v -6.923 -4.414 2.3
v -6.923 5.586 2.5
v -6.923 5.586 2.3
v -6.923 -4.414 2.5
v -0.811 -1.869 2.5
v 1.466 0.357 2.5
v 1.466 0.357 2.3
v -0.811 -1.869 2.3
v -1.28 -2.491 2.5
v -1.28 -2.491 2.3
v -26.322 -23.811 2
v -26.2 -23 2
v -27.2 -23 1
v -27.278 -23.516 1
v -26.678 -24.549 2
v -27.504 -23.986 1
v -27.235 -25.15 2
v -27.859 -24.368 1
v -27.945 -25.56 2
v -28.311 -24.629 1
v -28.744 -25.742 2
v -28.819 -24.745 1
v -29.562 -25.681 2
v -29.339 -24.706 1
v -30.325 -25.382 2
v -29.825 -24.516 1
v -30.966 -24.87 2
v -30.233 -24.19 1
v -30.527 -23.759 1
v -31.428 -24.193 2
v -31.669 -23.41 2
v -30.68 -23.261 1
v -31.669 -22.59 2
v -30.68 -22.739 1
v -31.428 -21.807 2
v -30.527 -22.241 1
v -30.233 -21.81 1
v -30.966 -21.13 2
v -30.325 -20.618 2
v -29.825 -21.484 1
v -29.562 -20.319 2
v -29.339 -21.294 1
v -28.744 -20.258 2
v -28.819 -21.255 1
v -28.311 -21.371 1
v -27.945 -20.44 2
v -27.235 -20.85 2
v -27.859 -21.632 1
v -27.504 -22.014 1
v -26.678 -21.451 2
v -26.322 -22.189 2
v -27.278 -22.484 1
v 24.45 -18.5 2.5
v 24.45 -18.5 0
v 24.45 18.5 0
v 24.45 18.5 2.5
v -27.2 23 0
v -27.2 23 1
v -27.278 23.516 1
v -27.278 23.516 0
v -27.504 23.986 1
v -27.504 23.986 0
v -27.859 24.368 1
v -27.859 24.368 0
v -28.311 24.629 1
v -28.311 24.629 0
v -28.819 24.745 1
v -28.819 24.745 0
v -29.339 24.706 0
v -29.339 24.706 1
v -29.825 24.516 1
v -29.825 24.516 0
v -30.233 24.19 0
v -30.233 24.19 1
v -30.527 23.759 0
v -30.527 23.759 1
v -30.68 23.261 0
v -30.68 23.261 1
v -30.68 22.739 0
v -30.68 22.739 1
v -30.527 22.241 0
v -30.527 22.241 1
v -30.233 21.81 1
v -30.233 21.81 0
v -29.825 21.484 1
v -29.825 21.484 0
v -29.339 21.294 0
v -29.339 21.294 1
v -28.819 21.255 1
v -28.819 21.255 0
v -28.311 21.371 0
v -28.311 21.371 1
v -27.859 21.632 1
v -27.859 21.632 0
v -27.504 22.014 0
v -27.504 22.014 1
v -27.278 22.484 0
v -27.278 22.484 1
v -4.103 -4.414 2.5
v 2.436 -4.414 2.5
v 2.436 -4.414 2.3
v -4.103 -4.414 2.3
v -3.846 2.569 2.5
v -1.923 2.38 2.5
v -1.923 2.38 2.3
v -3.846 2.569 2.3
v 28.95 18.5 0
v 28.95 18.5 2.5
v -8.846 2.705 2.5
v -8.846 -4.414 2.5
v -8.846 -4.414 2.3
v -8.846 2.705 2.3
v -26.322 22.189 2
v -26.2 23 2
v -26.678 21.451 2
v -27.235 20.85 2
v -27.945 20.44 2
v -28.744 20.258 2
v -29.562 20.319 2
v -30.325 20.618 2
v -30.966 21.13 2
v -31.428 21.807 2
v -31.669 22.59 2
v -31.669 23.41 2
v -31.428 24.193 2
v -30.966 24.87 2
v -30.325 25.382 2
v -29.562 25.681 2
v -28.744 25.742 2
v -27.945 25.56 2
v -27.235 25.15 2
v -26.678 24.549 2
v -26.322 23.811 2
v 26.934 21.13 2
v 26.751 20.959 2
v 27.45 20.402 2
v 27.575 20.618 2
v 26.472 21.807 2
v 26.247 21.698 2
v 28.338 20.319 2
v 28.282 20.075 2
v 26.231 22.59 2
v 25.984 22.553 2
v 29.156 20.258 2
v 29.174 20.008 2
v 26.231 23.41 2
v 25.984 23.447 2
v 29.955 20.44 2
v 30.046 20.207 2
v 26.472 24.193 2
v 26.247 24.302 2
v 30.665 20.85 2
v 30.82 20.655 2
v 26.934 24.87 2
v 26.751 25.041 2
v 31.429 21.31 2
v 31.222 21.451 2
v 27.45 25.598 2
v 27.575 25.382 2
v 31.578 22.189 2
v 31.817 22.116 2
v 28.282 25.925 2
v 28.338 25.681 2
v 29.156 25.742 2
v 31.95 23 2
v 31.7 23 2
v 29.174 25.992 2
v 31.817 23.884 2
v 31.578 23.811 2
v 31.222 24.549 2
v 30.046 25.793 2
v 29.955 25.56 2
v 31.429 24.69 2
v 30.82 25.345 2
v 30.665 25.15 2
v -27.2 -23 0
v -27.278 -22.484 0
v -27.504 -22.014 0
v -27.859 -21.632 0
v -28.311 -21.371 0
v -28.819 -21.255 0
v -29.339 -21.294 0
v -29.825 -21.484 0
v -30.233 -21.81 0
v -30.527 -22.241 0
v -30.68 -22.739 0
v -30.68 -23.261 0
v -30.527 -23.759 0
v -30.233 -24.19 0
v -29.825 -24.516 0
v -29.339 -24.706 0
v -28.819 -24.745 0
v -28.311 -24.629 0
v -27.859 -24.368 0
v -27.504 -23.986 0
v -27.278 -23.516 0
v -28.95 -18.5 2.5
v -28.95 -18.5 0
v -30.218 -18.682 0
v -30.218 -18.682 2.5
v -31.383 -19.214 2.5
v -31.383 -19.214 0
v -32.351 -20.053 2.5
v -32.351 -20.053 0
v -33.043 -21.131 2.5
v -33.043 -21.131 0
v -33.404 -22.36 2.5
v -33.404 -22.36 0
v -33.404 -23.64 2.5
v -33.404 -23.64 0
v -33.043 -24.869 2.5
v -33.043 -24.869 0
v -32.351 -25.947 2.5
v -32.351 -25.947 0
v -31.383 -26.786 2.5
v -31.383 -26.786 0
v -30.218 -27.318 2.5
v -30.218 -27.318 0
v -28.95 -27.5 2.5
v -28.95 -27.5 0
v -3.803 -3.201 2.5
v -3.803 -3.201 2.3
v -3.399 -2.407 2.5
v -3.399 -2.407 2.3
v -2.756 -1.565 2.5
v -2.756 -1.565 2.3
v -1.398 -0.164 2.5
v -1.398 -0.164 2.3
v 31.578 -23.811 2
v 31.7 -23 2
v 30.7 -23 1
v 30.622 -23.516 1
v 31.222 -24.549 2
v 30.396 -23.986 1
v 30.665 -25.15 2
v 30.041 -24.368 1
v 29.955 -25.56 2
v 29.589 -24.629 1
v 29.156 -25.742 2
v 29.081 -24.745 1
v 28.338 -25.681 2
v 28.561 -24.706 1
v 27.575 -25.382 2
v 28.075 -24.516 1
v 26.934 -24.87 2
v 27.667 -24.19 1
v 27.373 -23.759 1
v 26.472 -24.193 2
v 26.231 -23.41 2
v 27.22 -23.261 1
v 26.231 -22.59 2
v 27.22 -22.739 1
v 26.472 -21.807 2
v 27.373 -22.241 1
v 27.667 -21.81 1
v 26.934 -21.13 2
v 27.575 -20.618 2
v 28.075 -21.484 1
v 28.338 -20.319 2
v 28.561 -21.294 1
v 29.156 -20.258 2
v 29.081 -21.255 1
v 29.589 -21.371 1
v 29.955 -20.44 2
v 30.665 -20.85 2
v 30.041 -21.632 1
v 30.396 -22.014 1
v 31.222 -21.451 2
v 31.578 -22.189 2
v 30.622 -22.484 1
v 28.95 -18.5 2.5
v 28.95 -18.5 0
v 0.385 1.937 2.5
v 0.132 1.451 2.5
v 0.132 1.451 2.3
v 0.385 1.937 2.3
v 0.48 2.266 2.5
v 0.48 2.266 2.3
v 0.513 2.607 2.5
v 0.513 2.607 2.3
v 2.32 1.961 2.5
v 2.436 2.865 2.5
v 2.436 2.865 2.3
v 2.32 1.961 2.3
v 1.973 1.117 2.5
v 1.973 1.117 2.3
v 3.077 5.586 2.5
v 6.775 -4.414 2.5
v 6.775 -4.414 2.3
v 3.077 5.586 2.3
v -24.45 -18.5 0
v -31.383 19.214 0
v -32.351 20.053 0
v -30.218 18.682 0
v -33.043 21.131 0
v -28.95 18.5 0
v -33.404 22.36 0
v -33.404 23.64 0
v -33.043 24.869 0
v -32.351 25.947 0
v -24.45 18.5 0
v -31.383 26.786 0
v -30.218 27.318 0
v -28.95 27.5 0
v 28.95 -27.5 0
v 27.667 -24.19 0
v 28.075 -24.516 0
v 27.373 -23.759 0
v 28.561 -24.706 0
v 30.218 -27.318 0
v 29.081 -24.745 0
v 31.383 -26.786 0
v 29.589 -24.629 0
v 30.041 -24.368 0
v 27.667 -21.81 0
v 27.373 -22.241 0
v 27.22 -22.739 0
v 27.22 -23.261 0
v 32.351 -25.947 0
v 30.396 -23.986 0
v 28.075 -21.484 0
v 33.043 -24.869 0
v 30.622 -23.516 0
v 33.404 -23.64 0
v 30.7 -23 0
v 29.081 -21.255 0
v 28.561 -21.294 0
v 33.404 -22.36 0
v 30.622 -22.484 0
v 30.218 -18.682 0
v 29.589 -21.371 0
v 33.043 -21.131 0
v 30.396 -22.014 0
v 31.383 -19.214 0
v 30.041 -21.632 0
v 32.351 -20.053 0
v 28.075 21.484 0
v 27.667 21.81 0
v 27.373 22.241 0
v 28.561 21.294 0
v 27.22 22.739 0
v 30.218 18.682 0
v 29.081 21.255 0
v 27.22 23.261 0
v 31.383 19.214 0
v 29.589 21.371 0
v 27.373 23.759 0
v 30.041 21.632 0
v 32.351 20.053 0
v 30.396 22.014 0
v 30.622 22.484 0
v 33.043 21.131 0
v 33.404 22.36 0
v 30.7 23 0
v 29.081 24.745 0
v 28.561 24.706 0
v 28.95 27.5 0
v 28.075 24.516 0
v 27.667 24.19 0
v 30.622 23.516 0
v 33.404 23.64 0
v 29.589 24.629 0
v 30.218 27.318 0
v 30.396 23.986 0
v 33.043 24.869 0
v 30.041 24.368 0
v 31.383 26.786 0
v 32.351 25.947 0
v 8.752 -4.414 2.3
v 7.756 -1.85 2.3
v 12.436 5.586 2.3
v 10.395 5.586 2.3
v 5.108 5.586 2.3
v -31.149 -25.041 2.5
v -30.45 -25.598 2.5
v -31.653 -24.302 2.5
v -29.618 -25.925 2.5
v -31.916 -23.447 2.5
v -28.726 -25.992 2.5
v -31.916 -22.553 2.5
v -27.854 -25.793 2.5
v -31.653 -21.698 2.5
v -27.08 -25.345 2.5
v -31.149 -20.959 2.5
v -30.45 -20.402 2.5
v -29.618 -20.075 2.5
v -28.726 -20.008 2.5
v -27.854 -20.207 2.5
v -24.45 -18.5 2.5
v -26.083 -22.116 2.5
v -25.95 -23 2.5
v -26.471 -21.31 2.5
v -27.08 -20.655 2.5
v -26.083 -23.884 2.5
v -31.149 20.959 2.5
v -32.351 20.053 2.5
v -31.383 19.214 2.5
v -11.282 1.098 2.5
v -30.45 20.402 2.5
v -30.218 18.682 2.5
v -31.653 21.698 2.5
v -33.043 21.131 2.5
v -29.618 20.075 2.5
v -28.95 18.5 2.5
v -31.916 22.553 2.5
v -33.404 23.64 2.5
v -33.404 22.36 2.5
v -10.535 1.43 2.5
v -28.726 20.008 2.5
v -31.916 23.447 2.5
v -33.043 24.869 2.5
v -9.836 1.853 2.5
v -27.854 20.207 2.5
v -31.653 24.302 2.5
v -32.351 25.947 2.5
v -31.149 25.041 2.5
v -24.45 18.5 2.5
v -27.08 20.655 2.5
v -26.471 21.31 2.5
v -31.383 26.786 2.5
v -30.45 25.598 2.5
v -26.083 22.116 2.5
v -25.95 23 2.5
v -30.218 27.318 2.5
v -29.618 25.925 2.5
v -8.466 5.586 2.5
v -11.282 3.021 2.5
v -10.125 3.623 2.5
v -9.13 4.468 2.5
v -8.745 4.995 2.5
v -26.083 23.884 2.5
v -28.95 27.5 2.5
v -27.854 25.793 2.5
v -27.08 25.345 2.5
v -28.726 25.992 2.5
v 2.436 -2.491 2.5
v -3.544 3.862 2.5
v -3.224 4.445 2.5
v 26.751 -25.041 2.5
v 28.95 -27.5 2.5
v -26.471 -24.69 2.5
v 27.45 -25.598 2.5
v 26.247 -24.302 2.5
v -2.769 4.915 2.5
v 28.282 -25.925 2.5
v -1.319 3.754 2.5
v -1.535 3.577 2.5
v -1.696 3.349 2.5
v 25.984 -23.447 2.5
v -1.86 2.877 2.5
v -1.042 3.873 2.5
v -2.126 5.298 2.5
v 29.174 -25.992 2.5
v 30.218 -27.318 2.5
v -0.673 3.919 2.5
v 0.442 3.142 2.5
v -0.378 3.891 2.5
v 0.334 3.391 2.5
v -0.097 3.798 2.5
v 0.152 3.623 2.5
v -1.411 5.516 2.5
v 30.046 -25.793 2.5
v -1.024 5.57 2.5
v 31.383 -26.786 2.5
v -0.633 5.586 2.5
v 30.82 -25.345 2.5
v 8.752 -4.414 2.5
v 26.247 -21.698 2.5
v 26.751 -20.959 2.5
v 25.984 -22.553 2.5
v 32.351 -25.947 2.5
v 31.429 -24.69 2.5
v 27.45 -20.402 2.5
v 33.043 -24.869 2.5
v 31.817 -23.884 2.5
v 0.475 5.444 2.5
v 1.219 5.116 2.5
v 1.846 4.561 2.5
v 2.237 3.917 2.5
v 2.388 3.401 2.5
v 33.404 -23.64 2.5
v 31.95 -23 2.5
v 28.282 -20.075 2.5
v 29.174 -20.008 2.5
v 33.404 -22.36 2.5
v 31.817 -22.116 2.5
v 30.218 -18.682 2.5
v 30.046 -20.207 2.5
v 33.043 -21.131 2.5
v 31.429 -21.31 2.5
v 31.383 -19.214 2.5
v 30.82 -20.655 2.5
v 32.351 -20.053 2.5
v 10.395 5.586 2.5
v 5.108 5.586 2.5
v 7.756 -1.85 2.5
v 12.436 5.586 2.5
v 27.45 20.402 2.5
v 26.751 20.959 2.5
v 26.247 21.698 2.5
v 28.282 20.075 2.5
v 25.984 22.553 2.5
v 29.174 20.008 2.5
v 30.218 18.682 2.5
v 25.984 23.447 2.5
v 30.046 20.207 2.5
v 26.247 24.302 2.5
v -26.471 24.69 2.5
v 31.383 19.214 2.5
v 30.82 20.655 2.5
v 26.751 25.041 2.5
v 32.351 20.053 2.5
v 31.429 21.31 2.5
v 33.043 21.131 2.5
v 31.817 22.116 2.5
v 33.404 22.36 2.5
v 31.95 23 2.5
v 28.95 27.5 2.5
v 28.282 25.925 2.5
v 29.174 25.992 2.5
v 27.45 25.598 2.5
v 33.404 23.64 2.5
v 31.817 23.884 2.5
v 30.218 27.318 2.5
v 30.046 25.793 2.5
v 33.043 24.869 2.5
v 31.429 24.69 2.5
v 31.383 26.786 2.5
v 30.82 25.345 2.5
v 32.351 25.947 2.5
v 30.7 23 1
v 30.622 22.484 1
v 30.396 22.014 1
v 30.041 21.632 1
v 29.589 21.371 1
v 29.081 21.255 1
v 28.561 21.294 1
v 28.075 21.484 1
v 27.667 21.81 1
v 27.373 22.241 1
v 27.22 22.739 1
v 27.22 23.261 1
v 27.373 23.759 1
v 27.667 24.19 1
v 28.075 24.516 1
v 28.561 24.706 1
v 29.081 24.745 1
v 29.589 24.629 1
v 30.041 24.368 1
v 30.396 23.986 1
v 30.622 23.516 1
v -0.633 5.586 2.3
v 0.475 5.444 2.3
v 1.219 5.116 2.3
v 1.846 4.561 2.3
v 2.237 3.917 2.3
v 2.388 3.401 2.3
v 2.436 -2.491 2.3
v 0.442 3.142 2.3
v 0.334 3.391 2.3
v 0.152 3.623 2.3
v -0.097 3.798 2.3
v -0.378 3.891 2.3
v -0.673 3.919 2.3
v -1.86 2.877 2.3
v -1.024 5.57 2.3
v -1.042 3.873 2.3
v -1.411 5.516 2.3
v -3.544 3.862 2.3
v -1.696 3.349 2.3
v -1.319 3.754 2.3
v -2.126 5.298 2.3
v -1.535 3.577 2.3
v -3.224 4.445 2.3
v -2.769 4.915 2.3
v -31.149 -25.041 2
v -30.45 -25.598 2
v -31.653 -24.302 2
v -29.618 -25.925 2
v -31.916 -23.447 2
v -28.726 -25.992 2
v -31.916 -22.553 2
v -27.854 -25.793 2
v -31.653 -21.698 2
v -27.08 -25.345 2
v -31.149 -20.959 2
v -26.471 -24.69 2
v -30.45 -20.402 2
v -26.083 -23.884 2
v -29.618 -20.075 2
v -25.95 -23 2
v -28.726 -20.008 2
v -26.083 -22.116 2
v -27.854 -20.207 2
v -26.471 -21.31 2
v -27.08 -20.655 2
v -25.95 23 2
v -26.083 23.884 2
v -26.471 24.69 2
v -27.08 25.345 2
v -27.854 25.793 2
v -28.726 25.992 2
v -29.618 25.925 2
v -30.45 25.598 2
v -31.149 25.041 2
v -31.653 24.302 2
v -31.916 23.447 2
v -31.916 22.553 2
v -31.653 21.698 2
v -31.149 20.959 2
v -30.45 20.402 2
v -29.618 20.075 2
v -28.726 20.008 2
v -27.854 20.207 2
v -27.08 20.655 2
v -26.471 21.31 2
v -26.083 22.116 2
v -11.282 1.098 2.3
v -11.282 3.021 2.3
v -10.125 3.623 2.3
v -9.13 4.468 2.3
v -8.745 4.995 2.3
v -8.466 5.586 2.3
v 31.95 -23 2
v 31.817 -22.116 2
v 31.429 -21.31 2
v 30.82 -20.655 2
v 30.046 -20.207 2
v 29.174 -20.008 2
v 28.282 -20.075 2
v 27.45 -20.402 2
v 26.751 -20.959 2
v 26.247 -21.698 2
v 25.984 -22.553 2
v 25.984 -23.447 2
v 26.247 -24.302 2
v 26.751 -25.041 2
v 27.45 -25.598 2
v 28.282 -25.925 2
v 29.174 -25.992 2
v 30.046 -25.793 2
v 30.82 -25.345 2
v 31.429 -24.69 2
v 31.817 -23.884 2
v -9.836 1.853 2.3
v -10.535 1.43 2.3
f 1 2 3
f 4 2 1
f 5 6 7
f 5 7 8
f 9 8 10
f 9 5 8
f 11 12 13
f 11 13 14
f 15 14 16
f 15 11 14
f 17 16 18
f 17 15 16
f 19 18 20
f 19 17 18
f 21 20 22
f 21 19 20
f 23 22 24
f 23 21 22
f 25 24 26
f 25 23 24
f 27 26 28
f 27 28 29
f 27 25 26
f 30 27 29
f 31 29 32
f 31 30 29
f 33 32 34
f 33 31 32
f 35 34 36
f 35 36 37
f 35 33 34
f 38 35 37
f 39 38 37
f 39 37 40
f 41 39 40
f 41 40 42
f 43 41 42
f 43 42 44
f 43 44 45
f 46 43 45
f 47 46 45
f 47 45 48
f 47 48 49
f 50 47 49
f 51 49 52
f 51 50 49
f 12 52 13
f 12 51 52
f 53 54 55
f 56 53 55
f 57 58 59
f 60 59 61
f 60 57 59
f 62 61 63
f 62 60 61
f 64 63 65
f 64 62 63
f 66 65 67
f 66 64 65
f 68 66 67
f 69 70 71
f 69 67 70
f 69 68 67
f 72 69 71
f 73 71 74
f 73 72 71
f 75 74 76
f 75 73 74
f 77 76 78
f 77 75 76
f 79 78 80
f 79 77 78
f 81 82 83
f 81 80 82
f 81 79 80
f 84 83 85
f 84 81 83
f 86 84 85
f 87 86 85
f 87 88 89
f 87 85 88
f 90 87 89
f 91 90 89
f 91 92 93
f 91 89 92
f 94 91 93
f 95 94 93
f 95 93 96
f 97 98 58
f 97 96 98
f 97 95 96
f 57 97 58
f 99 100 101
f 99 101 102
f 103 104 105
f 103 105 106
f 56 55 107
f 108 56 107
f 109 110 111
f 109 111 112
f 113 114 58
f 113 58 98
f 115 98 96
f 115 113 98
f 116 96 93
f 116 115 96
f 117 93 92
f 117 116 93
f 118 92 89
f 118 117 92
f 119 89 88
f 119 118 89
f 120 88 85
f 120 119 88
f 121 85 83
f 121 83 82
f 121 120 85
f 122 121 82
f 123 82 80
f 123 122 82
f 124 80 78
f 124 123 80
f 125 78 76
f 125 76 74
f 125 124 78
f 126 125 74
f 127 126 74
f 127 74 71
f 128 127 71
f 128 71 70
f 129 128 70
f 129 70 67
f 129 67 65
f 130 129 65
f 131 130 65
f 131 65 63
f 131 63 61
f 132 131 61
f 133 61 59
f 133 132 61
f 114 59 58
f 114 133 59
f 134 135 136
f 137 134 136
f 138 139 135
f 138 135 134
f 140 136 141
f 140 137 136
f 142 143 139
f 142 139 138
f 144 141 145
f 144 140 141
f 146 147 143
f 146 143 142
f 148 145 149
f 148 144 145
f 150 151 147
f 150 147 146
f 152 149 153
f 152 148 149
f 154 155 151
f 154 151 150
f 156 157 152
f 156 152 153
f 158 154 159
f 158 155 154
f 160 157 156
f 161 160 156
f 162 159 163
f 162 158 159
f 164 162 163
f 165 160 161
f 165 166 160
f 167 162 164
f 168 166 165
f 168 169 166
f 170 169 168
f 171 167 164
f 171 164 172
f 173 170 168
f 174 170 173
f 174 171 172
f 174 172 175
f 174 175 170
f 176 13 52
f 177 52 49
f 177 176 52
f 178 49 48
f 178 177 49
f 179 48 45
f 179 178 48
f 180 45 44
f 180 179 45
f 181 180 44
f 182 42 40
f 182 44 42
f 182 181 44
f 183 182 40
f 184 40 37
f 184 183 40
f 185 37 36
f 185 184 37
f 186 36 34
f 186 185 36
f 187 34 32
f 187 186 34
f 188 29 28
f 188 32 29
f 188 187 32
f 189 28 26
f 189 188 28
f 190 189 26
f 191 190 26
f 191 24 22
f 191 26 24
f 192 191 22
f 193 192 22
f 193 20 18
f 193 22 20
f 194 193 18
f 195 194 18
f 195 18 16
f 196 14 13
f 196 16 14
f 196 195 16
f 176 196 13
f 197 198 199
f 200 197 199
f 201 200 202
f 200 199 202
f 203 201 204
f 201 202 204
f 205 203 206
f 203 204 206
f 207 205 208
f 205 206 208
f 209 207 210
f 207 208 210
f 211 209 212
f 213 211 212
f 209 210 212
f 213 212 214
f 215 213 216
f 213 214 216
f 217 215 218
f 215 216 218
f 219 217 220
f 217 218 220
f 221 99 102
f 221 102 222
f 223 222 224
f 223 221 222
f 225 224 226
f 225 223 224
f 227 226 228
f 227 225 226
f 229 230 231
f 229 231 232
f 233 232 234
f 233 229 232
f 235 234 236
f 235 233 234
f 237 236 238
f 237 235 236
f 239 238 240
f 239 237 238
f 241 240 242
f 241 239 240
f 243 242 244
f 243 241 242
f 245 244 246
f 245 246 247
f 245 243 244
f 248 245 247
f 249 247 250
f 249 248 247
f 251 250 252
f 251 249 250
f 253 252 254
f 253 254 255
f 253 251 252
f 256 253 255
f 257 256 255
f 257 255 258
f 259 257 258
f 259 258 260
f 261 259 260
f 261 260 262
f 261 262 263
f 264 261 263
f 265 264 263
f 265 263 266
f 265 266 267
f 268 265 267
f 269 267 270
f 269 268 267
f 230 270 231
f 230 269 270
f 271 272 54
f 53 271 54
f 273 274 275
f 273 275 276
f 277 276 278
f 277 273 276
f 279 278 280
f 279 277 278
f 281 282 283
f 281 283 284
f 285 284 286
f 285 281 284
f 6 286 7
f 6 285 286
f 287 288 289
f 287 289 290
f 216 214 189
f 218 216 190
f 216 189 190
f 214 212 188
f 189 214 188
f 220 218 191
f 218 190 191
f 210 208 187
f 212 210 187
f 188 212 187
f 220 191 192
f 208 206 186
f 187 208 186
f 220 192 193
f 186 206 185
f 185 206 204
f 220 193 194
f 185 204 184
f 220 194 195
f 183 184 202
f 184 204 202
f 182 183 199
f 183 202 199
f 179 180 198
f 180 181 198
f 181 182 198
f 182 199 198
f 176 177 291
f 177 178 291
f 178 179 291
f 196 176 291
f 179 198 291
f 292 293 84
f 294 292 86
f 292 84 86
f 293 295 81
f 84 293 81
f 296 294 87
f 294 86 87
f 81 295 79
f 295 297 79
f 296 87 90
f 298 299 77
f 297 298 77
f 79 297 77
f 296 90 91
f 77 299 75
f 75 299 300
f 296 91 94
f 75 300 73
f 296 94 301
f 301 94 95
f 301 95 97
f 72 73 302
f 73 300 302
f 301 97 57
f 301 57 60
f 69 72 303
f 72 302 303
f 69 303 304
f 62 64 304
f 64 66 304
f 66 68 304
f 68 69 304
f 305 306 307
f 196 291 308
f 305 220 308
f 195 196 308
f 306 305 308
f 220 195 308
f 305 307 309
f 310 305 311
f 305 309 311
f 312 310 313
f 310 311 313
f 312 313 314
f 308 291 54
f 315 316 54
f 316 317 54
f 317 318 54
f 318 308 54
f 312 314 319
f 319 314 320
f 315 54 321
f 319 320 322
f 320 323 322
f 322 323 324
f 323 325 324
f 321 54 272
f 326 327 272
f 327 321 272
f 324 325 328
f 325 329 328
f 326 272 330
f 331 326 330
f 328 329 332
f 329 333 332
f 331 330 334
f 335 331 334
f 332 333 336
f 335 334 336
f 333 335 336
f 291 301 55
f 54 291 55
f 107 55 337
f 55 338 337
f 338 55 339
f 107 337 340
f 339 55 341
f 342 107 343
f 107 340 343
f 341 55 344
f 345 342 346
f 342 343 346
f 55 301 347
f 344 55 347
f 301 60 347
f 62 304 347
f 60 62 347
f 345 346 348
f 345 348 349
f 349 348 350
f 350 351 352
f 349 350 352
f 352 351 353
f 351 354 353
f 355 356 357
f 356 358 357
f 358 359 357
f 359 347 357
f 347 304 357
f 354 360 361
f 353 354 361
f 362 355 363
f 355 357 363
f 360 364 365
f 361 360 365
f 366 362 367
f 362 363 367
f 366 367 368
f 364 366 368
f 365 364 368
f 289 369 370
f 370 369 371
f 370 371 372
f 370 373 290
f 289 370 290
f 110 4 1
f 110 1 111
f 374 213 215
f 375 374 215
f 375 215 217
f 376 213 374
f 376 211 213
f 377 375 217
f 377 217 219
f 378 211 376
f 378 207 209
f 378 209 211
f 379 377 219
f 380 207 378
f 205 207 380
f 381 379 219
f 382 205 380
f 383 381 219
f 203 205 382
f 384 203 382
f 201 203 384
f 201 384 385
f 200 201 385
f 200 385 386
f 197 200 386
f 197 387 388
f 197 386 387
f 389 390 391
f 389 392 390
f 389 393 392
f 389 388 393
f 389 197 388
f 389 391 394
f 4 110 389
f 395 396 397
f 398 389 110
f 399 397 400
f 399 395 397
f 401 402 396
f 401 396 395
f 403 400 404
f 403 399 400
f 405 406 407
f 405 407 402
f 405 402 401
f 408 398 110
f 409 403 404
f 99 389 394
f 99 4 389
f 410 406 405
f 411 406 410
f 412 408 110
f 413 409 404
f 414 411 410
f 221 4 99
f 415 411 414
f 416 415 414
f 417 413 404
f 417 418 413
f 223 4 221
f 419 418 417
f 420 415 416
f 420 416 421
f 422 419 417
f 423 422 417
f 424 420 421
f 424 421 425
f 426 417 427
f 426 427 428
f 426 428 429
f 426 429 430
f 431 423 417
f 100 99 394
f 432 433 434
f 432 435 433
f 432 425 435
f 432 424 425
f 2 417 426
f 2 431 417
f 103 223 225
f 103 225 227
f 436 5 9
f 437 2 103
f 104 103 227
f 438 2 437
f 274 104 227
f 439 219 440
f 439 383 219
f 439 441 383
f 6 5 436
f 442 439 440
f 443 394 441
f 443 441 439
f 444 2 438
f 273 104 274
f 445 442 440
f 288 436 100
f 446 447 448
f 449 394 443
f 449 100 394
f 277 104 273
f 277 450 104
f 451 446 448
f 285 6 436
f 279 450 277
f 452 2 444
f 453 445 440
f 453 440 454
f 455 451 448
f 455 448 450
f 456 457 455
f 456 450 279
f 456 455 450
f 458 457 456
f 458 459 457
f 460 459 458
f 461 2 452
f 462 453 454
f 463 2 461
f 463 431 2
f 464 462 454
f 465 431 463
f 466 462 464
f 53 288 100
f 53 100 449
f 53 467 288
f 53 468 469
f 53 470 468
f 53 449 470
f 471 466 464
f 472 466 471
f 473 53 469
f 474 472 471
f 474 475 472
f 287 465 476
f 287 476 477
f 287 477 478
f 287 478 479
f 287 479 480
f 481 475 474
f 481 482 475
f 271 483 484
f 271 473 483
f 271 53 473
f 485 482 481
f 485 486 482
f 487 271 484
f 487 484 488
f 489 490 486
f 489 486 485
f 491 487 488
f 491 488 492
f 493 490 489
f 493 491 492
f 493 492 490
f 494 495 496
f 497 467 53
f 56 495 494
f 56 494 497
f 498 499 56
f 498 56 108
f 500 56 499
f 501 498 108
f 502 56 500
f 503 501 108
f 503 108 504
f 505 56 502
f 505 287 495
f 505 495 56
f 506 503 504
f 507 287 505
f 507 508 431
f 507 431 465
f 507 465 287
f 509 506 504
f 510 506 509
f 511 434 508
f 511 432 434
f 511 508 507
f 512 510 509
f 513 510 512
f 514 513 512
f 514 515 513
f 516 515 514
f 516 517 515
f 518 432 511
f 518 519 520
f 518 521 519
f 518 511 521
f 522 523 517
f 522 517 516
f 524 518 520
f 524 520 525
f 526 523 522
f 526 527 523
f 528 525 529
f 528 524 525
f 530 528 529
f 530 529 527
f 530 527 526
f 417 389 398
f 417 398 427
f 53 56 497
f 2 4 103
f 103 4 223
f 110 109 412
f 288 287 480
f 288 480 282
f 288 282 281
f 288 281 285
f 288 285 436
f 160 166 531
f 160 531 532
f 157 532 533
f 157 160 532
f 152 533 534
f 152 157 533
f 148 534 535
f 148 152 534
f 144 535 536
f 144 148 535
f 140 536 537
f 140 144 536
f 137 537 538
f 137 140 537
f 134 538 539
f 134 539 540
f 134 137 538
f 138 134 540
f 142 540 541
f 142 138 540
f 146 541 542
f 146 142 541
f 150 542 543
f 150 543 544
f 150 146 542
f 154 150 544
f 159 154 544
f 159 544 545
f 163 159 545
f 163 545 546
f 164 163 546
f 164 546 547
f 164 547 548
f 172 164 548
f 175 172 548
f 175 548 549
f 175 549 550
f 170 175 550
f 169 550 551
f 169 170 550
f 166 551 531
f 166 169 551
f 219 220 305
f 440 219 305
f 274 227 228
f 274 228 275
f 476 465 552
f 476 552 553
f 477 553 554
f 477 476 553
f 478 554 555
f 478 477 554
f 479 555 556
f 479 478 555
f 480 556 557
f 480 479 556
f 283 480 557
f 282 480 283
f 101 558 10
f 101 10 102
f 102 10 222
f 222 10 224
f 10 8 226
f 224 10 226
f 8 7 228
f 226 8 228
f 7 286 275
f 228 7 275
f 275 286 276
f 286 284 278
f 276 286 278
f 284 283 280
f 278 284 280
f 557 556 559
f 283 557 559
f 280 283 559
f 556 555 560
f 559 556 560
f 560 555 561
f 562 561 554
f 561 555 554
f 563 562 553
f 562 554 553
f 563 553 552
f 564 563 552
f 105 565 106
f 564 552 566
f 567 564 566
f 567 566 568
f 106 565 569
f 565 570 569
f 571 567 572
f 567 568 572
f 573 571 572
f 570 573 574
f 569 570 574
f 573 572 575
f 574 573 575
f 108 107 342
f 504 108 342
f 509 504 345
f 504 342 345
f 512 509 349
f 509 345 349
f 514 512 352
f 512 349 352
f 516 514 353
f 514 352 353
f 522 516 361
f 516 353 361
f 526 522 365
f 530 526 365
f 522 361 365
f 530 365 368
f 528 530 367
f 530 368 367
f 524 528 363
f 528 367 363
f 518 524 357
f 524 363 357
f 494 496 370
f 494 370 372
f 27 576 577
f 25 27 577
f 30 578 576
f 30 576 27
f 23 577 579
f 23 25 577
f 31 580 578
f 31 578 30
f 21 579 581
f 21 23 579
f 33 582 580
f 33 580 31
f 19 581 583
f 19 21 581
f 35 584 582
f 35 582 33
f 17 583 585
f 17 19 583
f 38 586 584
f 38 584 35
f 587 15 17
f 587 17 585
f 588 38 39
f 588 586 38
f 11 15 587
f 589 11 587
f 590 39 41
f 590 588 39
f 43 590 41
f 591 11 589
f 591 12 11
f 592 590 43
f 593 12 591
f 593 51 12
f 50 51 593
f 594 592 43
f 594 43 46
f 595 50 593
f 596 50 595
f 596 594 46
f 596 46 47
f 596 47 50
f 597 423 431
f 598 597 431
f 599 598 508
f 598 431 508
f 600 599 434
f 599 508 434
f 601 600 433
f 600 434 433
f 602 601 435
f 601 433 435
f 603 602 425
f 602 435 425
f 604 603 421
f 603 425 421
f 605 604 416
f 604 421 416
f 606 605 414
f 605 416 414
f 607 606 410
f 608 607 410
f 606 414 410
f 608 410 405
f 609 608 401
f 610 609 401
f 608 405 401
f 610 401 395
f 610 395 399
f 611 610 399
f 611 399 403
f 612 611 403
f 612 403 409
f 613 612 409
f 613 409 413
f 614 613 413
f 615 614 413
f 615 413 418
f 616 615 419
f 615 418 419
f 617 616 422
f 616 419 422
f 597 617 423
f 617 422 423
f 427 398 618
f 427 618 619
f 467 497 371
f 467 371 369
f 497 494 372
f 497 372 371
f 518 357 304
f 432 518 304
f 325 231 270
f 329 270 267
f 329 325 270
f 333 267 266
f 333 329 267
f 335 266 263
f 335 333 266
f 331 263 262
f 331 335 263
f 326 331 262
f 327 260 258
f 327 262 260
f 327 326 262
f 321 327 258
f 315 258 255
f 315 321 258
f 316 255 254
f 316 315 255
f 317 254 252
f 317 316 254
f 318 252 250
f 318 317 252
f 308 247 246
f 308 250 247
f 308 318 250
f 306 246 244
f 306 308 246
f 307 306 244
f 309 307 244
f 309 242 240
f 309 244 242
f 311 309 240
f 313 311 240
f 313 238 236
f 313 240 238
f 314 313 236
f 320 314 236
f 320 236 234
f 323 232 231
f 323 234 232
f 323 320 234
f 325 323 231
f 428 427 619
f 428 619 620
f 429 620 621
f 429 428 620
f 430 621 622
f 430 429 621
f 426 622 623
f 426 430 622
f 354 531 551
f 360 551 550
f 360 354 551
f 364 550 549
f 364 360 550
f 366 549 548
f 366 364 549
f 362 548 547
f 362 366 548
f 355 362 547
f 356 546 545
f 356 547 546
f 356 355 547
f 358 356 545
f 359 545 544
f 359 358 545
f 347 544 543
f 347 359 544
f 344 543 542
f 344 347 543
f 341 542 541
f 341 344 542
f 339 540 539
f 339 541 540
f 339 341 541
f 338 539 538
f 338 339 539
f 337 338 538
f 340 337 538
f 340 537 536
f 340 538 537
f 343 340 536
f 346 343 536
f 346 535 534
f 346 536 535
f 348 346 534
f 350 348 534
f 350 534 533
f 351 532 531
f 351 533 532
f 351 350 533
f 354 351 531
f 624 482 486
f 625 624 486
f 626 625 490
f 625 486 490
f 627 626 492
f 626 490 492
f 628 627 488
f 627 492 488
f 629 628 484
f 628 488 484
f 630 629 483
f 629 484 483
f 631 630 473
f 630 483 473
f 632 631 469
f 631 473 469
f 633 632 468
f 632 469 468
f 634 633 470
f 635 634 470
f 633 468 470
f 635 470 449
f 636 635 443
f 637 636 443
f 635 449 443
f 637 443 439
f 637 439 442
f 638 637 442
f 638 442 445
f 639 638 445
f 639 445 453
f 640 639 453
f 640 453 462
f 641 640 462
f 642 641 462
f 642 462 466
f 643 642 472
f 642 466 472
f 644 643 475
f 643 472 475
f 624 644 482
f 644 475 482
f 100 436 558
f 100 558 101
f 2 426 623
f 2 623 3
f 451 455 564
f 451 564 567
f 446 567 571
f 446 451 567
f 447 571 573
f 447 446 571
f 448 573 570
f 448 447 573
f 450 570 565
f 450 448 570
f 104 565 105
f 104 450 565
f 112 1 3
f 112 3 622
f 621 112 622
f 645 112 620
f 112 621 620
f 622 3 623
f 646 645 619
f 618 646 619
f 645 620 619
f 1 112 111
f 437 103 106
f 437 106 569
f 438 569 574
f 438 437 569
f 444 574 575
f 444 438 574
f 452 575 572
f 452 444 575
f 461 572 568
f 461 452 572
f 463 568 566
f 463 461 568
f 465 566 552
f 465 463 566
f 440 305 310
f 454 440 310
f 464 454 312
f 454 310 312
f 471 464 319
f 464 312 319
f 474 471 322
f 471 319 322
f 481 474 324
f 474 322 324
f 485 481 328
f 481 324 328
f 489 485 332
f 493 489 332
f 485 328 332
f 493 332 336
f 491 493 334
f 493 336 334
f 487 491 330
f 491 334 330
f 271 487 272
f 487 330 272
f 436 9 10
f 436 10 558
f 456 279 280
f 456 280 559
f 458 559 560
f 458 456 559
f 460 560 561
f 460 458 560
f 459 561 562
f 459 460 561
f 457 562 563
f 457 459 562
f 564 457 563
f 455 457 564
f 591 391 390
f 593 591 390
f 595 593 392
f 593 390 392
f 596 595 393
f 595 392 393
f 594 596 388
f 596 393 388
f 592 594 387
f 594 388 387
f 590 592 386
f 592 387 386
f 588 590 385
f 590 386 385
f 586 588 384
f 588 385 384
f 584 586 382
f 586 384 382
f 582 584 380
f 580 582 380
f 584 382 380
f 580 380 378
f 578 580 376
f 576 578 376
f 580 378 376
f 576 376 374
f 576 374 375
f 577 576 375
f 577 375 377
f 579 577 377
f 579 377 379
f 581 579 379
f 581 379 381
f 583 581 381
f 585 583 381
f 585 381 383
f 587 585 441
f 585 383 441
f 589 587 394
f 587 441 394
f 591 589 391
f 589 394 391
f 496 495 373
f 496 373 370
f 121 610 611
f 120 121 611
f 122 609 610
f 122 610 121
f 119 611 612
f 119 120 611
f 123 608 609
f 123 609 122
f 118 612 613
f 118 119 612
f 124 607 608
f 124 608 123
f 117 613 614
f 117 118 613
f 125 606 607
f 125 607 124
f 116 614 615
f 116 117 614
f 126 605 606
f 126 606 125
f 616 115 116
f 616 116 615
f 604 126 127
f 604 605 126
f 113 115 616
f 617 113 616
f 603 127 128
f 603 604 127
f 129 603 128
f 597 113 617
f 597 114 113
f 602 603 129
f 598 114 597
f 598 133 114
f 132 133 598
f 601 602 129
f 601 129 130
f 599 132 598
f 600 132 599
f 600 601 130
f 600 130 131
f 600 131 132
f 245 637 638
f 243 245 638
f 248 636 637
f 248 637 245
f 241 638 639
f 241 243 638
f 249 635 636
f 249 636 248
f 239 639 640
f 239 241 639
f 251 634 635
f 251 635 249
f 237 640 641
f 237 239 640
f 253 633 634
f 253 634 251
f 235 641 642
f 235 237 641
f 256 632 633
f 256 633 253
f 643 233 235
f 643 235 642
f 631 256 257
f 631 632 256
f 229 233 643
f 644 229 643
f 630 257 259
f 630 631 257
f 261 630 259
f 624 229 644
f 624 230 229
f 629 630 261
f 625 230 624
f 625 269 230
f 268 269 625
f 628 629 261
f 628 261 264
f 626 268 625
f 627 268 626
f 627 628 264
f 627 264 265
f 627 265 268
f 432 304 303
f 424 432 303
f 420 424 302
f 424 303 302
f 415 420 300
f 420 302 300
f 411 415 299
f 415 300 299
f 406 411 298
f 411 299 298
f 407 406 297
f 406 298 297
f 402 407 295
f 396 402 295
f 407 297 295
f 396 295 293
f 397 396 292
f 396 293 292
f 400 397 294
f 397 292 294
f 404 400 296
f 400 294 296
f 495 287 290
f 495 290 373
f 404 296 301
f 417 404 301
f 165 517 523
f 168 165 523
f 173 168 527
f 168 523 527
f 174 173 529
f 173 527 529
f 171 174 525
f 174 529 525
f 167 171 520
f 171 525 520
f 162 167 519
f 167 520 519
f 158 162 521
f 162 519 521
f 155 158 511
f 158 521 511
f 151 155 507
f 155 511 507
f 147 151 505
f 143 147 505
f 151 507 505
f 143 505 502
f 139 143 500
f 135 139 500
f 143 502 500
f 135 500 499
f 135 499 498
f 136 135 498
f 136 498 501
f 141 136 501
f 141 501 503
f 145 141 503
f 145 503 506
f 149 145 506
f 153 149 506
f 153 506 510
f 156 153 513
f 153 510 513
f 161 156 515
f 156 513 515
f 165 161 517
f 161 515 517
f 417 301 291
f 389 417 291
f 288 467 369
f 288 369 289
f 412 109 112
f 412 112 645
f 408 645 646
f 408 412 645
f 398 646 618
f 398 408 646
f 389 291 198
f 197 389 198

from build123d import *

# Parameters (mm, degrees)
SKETCH1_R           = 1.75
BOSS_EXTRUDE1_DEPTH = 2.5
CUT_EXTRUDE1_DEPTH  = 0.2
SKETCH5_R           = 3
CUT_EXTRUDE2_DEPTH  = 0.5
CHAMFER2_SIZE       = 1


with BuildPart() as part:
    # Sketch1 → Boss-Extrude1 (new body)
    with BuildSketch(Plane.XY):
        with BuildLine():
            ThreePointArc((-28.95, 27.5), (-33.45, 23), (-28.95, 18.5))
            Line((-28.95, 18.5), (-24.45, 18.5))
            Line((-24.45, 18.5), (-24.45, -18.5))
            Line((-24.45, -18.5), (-28.95, -18.5))
            ThreePointArc((-28.95, -18.5), (-33.45, -23), (-28.95, -27.5))
            Line((-28.95, -27.5), (28.95, -27.5))
            ThreePointArc((28.95, -27.5), (33.45, -23), (28.95, -18.5))
            Line((28.95, -18.5), (24.45, -18.5))
            Line((24.45, -18.5), (24.45, 18.5))
            Line((24.45, 18.5), (28.95, 18.5))
            ThreePointArc((28.95, 18.5), (33.45, 23), (28.95, 27.5))
            Line((28.95, 27.5), (-28.95, 27.5))
        make_face()
        with Locations((-28.95, -23)):
            Circle(SKETCH1_R, mode=Mode.SUBTRACT)
        with Locations((-28.95, 23)):
            Circle(SKETCH1_R, mode=Mode.SUBTRACT)
        with Locations((28.95, 23)):
            Circle(SKETCH1_R, mode=Mode.SUBTRACT)
        with Locations((28.95, -23)):
            Circle(SKETCH1_R, mode=Mode.SUBTRACT)
    extrude(amount=BOSS_EXTRUDE1_DEPTH)

    # Sketch4 → Cut-Extrude1 (cut)
    with BuildSketch(Plane.XY.offset(2.5)):
        with BuildLine():
            Line((-6.923076923, -4.414458023), (-8.846153846, -4.414458023))
            Line((-8.846153846, -4.414458023), (-8.846153846, 2.704933003))
            add(Edge.make_bspline(
                [(-8.846153846, 2.704933003), (-8.933318023, 2.616445103), (-9.106463901, 2.440669737), (-9.383005145, 2.19548654), (-9.670097117, 1.967401521), (-9.970580856, 1.758581072), (-10.280528273, 1.566049869), (-10.603106853, 1.391327059), (-10.935978437, 1.231995104), (-11.166572995, 1.142953291), (-11.282051282, 1.09836249)],
                knots=[0, 0, 0, 0, 0.000372537, 0.00074002, 0.001107934, 0.001471928, 0.001837155, 0.002201986, 0.002572064, 0.002943306, 0.002943306, 0.002943306, 0.002943306], degree=3))
            Line((-11.282051282, 1.09836249), (-11.282051282, 3.021439413))
            add(Edge.make_bspline(
                [(-11.282051282, 3.021439413), (-11.153980048, 3.06946063), (-10.88593692, 3.1699653), (-10.490395403, 3.38374383), (-10.077539391, 3.648423218), (-9.730716774, 3.908012402), (-9.455353873, 4.138807932), (-9.26289614, 4.324331325), (-9.084572984, 4.514316902), (-8.927087219, 4.714896702), (-8.786304768, 4.922015444), (-8.661565378, 5.135334763), (-8.551766041, 5.355528522), (-8.494286856, 5.508866571), (-8.465544872, 5.585541977)],
                knots=[0, 0, 0, 0, 0.000409928, 0.000857948, 0.001345291, 0.001880548, 0.002156279, 0.002422637, 0.002682042, 0.002937331, 0.003186801, 0.003432796, 0.003678268, 0.003923781, 0.003923781, 0.003923781, 0.003923781], degree=3))
            Line((-8.465544872, 5.585541977), (-6.923076923, 5.585541977))
            Line((-6.923076923, 5.585541977), (-6.923076923, -4.414458023))
        make_face()
        with BuildLine():
            Line((2.435897436, -2.4913811), (2.435897436, -4.414458023))
            Line((2.435897436, -4.414458023), (-4.102564103, -4.414458023))
            add(Edge.make_bspline(
                [(-4.102564103, -4.414458023), (-4.080426387, -4.250103198), (-4.036163368, -3.921485704), (-3.899317938, -3.441458257), (-3.716676165, -2.973033485), (-3.518453211, -2.59184942), (-3.321298527, -2.285009365), (-3.142420071, -2.033582253), (-2.929024642, -1.766074598), (-2.684208836, -1.480326872), (-2.409325608, -1.175445832), (-2.102324151, -0.852564961), (-1.761740021, -0.513229981), (-1.522133018, -0.282804832), (-1.398237179, -0.163656741)],
                knots=[0, 0, 0, 0, 0.000496964, 0.00099365, 0.001492867, 0.002003586, 0.002279214, 0.0025866, 0.002928861, 0.003305405, 0.003715318, 0.004160237, 0.004641841, 0.005157509, 0.005157509, 0.005157509, 0.005157509], degree=3))
            add(Edge.make_bspline(
                [(-1.398237179, -0.163656741), (-1.299366883, -0.068219837), (-1.111146958, 0.113463921), (-0.843121421, 0.373627698), (-0.607499354, 0.612792158), (-0.399354228, 0.824759525), (-0.22349449, 1.014927025), (-0.077606865, 1.180308106), (0.040156295, 1.321576252), (0.103936924, 1.411196852), (0.132211538, 1.450926592)],
                knots=[0, 0, 0, 0, 0.000412257, 0.000784815, 0.001120524, 0.001419431, 0.001676006, 0.00189743, 0.002081082, 0.002227329, 0.002227329, 0.002227329, 0.002227329], degree=3))
            add(Edge.make_bspline(
                [(0.132211538, 1.450926592), (0.190111047, 1.547103861), (0.30179249, 1.73261867), (0.424260458, 2.024344061), (0.497770298, 2.316009192), (0.507857836, 2.510898163), (0.512820513, 2.606775951)],
                knots=[0, 0, 0, 0, 0.000336425, 0.000648925, 0.000945785, 0.00123325, 0.00123325, 0.00123325, 0.00123325], degree=3))
            add(Edge.make_bspline(
                [(0.512820513, 2.606775951), (0.509218846, 2.70654968), (0.502404775, 2.895313794), (0.445267605, 3.161694863), (0.343944107, 3.390687129), (0.204440295, 3.582993487), (0.028037447, 3.733664782), (-0.178182613, 3.844996243), (-0.417238616, 3.906548032), (-0.585261277, 3.914644013), (-0.673076923, 3.91887531)],
                knots=[0, 0, 0, 0, 0.000299149, 0.000565967, 0.000811668, 0.001045254, 0.001272527, 0.001501953, 0.00174248, 0.002005823, 0.002005823, 0.002005823, 0.002005823], degree=3))
            add(Edge.make_bspline(
                [(-0.673076923, 3.91887531), (-0.760299295, 3.914923595), (-0.928794085, 3.907289734), (-1.168261741, 3.840601371), (-1.377751743, 3.7251568), (-1.52704546, 3.593596575), (-1.627900447, 3.465663812), (-1.696619517, 3.354178836), (-1.755849991, 3.227497715), (-1.808333132, 3.087046666), (-1.84978888, 2.931216675), (-1.883174765, 2.761194545), (-1.910078959, 2.576065314), (-1.918634967, 2.447276207), (-1.923076923, 2.380413772)],
                knots=[0, 0, 0, 0, 0.000261347, 0.000504866, 0.000737962, 0.000973524, 0.001096162, 0.001225691, 0.001365471, 0.001515056, 0.001674936, 0.001848581, 0.002034706, 0.002235667, 0.002235667, 0.002235667, 0.002235667], degree=3))
            Line((-1.923076923, 2.380413772), (-3.846153846, 2.568715054))
            add(Edge.make_bspline(
                [(-3.846153846, 2.568715054), (-3.830692606, 2.698546985), (-3.80071573, 2.950270356), (-3.725907936, 3.311831909), (-3.631166636, 3.645388763), (-3.511975194, 3.950321896), (-3.373259936, 4.228570387), (-3.207945231, 4.475958944), (-3.021807349, 4.695227932), (-2.814685425, 4.886260652), (-2.5878962, 5.049664829), (-2.349921603, 5.195528131), (-2.096110944, 5.315182407), (-1.829258686, 5.413795508), (-1.549485425, 5.49260631), (-1.255497172, 5.544714943), (-0.949108314, 5.581368356), (-0.739966, 5.584129802), (-0.633012821, 5.585541977)],
                knots=[0, 0, 0, 0, 0.000392096, 0.000760212, 0.001106367, 0.001431121, 0.001741094, 0.002037223, 0.002321424, 0.002602116, 0.002880179, 0.003158798, 0.003438358, 0.003720412, 0.004011539, 0.004308966, 0.004615352, 0.004936021, 0.004936021, 0.004936021, 0.004936021], degree=3))
            add(Edge.make_bspline(
                [(-0.633012821, 5.585541977), (-0.516740897, 5.583307291), (-0.290286727, 5.57895496), (0.040296159, 5.543013371), (0.350855029, 5.480344005), (0.644105005, 5.397329559), (0.917034567, 5.286499204), (1.171918028, 5.152509913), (1.404743968, 4.990276522), (1.618982973, 4.808646307), (1.810495503, 4.608911963), (1.978243149, 4.395861516), (2.118781575, 4.169643399), (2.236714897, 3.93301496), (2.324279592, 3.682168505), (2.388083037, 3.420572552), (2.43038729, 3.147006702), (2.434040407, 2.960167431), (2.435897436, 2.865189413)],
                knots=[0, 0, 0, 0, 0.000348765, 0.000679263, 0.000995909, 0.001298314, 0.001592185, 0.001878054, 0.002160328, 0.002441705, 0.002719393, 0.002989083, 0.003253658, 0.003517047, 0.003780619, 0.004048809, 0.004324175, 0.004608884, 0.004608884, 0.004608884, 0.004608884], degree=3))
            add(Edge.make_bspline(
                [(2.435897436, 2.865189413), (2.433450826, 2.756184824), (2.428597126, 2.539936446), (2.382126554, 2.220256739), (2.311128567, 1.907948806), (2.206199134, 1.602249395), (2.073192931, 1.295825486), (1.901744746, 0.987989283), (1.702680436, 0.669456993), (1.546820928, 0.463511968), (1.466346154, 0.357176592)],
                knots=[0, 0, 0, 0, 0.000326823, 0.000648367, 0.000967129, 0.0012864, 0.001616516, 0.001967917, 0.002342489, 0.002742354, 0.002742354, 0.002742354, 0.002742354], degree=3))
            add(Edge.make_bspline(
                [(1.466346154, 0.357176592), (1.435930222, 0.318867637), (1.370786347, 0.236818733), (1.259959496, 0.111009427), (1.131520709, -0.026413994), (0.987284126, -0.178023781), (0.82248533, -0.338451015), (0.643053791, -0.51440464), (0.441093999, -0.696884043), (0.231912595, -0.890441198), (0.021821946, -1.078827655), (-0.171281651, -1.257753025), (-0.34668397, -1.416063548), (-0.496216198, -1.562498691), (-0.628673782, -1.687064362), (-0.739282513, -1.796148144), (-0.830112141, -1.887109206), (-0.955269523, -2.028894425), (-1.114518089, -2.220658992), (-1.226555966, -2.40389546), (-1.280048077, -2.4913811)],
                knots=[0, 0, 0, 0, 0.000146727, 0.000314255, 0.00050278, 0.000711046, 0.000941937, 0.00119269, 0.00146489, 0.001758378, 0.002047687, 0.002311396, 0.002548156, 0.002756422, 0.002939197, 0.0030936, 0.003222507, 0.003324651, 0.003660963, 0.003968244, 0.003968244, 0.003968244, 0.003968244], degree=3))
            Line((-1.280048077, -2.4913811), (2.435897436, -2.4913811))
        make_face()
        Polygon((6.774839744, -4.414458023), (3.076923077, 5.585541977), (5.108173077, 5.585541977), (7.756410256, -1.850355459), (10.39463141, 5.585541977), (12.435897436, 5.585541977), (8.752003205, -4.414458023), align=None)
    extrude(amount=-CUT_EXTRUDE1_DEPTH, mode=Mode.SUBTRACT)

    # Sketch5 → Cut-Extrude2 (cut)
    with BuildSketch(Plane.XY.offset(2.5)):
        with Locations((-28.95, 23)):
            Circle(SKETCH5_R)
        with Locations((28.95, 23)):
            Circle(SKETCH5_R)
        with Locations((28.95, -23)):
            Circle(SKETCH5_R)
        with Locations((-28.95, -23)):
            Circle(SKETCH5_R)
    extrude(amount=-CUT_EXTRUDE2_DEPTH, mode=Mode.SUBTRACT)

    # Chamfer2
    chamfer2_edges = [part.edges().sort_by_distance(p)[0] for p in [
        (-30.7, 23, 2),
        (27.2, 23, 2),
        (27.2, -23, 2),
        (-30.7, -23, 2),
    ]]
    chamfer(chamfer2_edges, length=CHAMFER2_SIZE)


solid = part.part
